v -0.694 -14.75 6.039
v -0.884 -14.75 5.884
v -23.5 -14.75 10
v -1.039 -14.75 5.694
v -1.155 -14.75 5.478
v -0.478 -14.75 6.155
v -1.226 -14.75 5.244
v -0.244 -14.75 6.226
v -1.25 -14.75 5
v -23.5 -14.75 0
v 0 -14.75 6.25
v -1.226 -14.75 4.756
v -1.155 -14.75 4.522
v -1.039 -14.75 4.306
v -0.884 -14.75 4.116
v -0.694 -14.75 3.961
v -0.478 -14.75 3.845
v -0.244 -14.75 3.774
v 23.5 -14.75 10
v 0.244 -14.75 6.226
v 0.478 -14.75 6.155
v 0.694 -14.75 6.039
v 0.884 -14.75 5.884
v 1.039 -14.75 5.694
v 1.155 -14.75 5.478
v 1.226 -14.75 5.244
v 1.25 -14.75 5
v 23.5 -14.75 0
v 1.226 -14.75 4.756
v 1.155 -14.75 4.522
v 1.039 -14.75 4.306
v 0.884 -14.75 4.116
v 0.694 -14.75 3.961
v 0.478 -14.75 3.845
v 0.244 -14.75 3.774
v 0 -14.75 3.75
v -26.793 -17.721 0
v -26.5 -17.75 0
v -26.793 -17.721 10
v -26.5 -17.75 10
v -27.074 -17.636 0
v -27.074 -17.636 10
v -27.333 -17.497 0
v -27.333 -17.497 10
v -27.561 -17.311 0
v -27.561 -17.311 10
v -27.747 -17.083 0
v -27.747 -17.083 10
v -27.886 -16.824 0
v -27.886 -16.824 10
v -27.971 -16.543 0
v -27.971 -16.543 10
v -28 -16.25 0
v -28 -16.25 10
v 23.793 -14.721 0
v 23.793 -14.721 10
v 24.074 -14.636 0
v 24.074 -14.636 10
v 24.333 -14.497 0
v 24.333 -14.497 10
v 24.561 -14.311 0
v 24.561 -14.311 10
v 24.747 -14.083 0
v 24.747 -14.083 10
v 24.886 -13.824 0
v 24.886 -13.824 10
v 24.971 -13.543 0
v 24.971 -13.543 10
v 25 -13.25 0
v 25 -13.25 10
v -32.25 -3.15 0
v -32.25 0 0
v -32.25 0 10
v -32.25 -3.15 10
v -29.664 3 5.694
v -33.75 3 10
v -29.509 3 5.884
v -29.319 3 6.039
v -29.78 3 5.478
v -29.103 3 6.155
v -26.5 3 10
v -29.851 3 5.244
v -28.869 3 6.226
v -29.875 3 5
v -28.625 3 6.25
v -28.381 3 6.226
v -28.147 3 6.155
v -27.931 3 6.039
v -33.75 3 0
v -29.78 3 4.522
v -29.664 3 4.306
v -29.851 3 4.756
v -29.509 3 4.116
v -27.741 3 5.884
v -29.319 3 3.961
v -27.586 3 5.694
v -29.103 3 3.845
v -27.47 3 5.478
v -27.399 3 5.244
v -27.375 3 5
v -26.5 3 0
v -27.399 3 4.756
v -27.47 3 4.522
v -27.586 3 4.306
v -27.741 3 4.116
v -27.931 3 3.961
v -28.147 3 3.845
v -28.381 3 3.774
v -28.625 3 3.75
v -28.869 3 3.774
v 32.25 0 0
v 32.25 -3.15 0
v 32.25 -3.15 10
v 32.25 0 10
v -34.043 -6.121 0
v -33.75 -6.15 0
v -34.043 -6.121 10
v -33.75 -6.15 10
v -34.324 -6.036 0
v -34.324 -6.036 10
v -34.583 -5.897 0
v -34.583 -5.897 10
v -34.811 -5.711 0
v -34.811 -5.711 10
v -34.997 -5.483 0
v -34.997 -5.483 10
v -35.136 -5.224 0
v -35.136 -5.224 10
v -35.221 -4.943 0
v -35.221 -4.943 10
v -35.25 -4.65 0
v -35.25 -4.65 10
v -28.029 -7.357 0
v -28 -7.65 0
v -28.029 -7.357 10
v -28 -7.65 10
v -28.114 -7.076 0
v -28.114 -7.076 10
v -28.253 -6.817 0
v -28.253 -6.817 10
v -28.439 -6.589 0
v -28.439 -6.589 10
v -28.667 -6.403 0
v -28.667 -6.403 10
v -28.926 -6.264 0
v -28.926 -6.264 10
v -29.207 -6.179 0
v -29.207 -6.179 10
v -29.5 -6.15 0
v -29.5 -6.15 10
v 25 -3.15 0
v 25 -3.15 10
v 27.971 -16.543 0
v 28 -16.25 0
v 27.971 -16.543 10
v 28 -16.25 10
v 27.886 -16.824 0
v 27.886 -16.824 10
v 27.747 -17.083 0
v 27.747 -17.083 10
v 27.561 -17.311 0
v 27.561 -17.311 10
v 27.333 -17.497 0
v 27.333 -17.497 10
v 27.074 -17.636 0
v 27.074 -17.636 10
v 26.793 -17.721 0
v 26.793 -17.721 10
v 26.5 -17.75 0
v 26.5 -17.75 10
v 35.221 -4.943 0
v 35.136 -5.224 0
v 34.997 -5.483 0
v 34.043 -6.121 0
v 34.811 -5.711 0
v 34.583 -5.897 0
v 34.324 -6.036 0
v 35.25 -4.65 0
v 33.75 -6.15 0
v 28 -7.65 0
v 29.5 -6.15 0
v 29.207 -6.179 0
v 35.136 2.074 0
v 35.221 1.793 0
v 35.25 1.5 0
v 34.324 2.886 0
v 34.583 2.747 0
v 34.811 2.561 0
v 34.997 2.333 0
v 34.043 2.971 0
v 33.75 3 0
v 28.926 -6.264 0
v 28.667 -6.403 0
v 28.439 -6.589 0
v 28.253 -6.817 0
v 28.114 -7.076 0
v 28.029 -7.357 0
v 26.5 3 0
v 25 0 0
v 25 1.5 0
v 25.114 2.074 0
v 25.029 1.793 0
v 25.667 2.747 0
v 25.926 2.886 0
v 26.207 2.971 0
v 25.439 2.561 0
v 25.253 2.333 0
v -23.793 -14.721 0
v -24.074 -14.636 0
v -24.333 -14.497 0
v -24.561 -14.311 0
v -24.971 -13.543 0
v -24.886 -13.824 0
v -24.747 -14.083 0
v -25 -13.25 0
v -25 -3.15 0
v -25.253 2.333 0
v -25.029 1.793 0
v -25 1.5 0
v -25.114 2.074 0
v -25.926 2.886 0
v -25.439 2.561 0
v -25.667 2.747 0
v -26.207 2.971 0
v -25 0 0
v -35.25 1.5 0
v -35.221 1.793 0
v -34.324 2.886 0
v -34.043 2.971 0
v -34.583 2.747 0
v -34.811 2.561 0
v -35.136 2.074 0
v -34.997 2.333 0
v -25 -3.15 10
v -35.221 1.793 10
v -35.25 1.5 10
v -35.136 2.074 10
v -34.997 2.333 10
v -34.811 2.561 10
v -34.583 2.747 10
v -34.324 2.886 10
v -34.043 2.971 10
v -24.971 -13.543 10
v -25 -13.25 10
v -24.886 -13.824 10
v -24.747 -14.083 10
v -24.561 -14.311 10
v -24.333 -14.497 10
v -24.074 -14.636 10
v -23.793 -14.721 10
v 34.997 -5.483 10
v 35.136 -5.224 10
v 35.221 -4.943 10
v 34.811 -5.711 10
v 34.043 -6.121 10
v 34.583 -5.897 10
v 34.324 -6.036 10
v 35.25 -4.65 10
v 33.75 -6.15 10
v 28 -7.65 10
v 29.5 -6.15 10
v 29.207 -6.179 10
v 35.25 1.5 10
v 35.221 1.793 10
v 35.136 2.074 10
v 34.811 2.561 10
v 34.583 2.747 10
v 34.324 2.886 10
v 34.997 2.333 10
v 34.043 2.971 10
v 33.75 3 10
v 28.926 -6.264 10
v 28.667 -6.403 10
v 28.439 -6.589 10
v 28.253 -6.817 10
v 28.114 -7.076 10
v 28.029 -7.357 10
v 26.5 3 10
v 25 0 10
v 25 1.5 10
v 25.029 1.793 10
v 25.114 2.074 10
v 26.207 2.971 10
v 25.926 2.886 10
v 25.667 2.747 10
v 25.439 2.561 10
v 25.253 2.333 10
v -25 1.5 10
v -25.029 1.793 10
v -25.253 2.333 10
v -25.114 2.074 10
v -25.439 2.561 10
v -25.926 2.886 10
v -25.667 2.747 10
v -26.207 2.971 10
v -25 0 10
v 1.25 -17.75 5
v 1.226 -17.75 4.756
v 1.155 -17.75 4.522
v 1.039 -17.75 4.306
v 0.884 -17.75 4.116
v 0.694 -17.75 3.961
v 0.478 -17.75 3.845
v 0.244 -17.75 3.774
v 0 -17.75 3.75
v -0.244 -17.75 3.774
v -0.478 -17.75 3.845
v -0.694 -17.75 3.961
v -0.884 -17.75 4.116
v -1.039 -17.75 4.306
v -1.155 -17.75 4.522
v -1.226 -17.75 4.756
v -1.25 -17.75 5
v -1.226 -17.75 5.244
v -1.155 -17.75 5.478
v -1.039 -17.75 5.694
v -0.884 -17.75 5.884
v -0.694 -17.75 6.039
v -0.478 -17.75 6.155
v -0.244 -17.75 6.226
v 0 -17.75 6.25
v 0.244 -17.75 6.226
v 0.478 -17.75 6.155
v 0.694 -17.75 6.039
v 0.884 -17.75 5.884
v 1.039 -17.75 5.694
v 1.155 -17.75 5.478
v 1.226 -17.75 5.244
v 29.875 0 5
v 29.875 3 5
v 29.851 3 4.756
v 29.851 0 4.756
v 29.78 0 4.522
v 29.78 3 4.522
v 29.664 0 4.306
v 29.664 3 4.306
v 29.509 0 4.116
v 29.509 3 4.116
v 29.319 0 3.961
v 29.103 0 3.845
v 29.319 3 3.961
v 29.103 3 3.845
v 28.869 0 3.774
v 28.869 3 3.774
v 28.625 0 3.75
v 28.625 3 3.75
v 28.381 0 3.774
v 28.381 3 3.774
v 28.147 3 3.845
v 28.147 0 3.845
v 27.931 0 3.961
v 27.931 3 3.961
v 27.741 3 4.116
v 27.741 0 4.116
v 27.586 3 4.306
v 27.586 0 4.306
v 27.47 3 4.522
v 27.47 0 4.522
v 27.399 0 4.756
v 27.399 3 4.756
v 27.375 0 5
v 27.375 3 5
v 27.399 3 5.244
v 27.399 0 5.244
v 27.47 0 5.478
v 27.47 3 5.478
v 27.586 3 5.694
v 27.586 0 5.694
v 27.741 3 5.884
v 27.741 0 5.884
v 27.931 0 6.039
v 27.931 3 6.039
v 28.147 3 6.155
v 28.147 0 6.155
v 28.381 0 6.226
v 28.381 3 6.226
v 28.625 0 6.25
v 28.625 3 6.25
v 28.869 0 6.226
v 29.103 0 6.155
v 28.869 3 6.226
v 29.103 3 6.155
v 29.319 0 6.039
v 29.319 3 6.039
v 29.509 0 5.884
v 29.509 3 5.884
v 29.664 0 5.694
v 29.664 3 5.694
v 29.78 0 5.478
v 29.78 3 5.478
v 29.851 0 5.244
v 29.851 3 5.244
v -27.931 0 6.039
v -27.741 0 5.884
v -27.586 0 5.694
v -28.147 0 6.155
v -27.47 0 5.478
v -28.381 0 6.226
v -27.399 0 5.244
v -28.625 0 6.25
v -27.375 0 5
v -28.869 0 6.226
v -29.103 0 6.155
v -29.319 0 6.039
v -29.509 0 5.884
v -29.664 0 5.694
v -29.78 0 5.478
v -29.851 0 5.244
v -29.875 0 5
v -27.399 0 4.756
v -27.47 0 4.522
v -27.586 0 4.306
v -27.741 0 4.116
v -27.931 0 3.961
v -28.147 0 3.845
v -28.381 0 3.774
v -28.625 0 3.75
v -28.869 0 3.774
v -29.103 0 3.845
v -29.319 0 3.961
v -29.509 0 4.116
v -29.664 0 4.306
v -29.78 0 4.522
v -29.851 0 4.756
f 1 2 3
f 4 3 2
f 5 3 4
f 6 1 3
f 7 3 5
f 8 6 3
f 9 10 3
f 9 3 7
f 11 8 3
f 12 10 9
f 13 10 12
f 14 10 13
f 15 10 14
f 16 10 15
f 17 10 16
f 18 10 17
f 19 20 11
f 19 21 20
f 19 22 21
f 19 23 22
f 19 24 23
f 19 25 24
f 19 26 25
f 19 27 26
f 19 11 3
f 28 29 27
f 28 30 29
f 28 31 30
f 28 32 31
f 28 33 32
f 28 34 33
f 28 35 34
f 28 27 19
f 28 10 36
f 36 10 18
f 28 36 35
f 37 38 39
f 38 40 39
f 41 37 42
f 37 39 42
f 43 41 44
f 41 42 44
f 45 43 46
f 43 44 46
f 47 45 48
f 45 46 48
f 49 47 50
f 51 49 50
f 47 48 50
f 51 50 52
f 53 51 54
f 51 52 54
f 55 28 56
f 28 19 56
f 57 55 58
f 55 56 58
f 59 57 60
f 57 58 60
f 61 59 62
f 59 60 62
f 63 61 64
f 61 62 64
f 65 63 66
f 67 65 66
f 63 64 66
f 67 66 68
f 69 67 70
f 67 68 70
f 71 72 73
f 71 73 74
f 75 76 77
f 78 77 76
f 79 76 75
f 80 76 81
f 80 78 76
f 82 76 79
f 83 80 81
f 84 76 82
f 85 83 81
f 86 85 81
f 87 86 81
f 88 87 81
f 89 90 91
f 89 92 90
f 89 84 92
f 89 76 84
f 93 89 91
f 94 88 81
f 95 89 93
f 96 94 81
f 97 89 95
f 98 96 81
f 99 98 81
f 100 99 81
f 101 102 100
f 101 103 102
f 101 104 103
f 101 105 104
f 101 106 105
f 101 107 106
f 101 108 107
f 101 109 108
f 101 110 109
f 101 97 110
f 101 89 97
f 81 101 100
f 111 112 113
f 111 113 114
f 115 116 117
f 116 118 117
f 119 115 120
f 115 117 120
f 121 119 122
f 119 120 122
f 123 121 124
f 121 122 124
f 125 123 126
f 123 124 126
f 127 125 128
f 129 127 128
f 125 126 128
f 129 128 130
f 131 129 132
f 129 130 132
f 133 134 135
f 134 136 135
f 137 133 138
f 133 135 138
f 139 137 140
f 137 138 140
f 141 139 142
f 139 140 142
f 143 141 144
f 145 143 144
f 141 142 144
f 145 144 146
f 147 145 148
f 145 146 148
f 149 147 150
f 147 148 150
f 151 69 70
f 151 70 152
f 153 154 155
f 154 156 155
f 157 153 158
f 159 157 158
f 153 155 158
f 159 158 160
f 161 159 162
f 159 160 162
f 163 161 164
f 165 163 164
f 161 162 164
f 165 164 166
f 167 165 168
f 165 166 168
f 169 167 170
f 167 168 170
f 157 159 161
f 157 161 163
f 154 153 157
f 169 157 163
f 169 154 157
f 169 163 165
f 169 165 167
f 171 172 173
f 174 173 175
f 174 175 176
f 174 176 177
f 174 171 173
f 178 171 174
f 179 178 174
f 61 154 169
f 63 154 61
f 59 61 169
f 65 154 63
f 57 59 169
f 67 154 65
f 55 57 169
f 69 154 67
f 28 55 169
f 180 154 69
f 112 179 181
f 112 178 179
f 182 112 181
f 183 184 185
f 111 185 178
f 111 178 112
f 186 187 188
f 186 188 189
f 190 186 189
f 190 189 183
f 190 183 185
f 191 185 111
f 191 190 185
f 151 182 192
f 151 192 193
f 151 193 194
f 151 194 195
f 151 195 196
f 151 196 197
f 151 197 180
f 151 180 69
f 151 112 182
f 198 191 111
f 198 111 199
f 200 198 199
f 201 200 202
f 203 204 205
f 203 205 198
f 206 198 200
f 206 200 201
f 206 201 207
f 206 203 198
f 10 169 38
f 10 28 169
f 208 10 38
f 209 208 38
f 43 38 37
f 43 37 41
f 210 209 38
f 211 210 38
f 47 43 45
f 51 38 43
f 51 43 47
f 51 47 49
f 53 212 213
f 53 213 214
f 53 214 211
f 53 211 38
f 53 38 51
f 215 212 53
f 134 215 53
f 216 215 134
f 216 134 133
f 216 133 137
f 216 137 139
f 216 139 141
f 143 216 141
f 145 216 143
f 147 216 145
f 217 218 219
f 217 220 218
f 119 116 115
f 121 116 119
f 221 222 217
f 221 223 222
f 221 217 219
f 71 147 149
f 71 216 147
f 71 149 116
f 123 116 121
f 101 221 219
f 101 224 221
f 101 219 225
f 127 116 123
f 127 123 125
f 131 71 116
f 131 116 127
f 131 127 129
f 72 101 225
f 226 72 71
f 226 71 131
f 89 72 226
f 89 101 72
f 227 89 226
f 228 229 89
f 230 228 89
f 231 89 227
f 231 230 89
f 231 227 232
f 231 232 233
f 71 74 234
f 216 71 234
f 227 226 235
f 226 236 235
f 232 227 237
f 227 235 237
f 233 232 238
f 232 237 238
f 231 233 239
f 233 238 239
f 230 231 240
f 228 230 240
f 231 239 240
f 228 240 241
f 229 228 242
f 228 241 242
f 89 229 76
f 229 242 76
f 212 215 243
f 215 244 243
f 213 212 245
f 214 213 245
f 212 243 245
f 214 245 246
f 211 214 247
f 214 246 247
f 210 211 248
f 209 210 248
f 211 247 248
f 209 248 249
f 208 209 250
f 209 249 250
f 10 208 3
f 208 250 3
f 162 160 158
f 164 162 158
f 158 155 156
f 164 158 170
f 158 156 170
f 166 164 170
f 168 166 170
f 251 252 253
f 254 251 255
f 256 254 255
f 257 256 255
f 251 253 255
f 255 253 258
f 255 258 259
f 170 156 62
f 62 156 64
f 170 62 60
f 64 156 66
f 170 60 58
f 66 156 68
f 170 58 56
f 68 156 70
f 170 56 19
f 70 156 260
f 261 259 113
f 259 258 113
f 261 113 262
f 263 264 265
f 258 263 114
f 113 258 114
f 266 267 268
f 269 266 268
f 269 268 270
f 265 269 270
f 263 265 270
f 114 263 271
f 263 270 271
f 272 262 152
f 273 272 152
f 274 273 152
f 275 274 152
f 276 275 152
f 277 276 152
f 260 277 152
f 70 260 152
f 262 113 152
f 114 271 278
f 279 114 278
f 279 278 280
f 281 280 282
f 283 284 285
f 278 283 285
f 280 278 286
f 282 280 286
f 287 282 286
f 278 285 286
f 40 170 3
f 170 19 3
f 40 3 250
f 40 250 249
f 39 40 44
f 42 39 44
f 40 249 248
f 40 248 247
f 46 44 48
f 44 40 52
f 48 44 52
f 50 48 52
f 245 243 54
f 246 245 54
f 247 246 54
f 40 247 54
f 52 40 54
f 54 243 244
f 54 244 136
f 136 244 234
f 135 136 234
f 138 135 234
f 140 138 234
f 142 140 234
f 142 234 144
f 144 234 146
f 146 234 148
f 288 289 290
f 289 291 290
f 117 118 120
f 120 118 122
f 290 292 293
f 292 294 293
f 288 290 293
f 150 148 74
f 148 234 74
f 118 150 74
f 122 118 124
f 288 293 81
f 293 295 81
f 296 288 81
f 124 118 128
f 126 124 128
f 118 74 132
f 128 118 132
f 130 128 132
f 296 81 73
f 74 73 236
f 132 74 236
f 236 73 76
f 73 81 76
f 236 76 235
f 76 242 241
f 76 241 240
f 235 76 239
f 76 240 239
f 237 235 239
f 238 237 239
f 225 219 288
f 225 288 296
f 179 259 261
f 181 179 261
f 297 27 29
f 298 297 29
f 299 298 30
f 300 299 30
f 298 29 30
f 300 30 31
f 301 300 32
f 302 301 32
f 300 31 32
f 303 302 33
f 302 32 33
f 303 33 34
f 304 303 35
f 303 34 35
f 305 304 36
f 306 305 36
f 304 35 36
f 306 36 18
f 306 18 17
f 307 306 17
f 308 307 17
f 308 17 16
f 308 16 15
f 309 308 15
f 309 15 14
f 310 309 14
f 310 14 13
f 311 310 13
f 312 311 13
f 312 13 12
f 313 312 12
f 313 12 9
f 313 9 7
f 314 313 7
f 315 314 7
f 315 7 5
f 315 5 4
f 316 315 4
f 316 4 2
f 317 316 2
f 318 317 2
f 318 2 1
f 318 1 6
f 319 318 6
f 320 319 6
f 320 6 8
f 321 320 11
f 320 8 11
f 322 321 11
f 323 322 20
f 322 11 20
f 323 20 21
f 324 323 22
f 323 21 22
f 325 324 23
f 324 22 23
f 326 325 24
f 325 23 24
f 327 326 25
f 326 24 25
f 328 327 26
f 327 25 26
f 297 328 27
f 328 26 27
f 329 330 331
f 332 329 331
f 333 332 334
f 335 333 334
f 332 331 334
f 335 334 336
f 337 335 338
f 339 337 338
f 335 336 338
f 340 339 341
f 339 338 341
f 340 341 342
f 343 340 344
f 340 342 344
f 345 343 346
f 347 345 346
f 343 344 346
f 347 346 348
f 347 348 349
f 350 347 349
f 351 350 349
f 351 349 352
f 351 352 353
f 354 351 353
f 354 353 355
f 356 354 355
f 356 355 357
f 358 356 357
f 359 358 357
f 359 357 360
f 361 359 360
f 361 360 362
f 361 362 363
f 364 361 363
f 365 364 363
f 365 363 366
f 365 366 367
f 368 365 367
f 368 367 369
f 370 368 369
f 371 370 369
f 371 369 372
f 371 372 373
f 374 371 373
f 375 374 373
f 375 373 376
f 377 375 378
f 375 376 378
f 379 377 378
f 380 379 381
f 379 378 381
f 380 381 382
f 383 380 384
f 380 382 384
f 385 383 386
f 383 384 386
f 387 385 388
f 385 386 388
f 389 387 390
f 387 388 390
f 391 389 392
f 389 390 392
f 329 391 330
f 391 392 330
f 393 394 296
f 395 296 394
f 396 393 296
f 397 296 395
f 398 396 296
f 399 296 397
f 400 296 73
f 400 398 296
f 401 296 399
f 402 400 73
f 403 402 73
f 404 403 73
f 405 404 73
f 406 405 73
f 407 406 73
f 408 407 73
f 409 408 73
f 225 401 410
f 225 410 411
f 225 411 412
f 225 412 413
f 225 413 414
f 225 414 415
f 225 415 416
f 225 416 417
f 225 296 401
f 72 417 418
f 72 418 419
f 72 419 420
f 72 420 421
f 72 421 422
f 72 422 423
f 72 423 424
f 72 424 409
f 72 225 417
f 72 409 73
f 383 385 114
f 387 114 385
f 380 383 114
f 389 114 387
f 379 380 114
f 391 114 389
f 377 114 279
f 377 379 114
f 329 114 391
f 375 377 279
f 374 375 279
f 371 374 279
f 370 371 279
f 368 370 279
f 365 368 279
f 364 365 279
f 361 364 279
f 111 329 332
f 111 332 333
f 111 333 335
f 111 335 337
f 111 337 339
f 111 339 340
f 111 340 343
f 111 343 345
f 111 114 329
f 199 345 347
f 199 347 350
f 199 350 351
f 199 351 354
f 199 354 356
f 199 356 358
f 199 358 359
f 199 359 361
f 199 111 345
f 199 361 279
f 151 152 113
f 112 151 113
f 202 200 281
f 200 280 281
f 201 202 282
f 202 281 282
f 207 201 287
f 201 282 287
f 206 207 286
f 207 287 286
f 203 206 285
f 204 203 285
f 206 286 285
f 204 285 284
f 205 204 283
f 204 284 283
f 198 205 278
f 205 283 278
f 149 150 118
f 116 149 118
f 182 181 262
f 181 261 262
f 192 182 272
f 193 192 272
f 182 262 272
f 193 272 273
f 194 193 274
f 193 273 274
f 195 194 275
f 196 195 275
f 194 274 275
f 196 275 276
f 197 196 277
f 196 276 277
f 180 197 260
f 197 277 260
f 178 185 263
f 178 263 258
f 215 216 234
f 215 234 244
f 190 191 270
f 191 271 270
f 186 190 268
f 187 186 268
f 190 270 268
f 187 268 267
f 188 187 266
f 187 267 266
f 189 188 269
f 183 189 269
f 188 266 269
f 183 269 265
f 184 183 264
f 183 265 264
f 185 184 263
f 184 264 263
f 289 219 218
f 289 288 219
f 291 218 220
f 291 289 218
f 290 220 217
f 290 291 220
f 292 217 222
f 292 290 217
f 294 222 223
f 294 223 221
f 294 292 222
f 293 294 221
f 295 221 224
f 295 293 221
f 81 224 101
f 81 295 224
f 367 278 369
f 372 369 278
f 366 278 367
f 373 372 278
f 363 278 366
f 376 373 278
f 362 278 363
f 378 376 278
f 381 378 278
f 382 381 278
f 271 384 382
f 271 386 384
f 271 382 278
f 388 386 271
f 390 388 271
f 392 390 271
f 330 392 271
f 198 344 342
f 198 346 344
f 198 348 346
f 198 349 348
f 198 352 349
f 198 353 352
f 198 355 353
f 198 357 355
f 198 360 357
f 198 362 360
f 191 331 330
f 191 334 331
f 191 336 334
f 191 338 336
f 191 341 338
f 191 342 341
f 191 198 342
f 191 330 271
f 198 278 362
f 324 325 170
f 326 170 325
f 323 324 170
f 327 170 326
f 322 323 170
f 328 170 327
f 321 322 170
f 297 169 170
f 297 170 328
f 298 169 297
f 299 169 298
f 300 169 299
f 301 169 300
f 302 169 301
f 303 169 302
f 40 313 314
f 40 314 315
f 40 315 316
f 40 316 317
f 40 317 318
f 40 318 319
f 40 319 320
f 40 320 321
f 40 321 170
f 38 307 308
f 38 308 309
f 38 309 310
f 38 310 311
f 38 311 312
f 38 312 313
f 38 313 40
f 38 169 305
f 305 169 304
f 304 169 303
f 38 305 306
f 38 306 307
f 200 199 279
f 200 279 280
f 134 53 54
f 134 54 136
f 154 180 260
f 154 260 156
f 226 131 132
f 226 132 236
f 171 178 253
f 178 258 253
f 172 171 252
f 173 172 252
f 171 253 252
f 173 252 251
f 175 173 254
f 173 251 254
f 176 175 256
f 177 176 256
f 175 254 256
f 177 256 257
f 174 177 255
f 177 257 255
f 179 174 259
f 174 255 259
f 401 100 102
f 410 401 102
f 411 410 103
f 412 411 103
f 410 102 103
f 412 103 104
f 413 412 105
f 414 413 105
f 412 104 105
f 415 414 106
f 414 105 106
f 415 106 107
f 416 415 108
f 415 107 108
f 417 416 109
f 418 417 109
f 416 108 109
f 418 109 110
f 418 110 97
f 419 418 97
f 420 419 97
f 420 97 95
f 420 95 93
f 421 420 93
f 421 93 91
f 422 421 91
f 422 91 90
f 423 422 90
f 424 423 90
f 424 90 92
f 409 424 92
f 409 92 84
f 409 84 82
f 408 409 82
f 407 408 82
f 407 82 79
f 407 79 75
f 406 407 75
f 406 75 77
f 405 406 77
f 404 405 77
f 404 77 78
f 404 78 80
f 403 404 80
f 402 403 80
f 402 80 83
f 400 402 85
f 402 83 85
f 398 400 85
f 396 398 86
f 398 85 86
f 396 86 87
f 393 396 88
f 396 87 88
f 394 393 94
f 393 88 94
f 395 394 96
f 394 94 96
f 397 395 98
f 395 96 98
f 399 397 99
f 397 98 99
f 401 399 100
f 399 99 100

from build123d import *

# Parameters (mm, degrees)
BOSS_EXTRUDE1_DEPTH = 10
CUT_EXTRUDE2_REACH  = 22.75
SKETCH4_R           = 1.25
SKETCH5_R           = 1.25
CUT_EXTRUDE3_DEPTH  = 4
FILLET1_R           = 1.5


with BuildPart() as part:
    # Sketch1 → Boss-Extrude1 (new body)
    with BuildSketch(Plane.XY):
        Polygon((-32.25, 0), (-32.25, -3.15), (-25, -3.15), (-25, -14.75), (25, -14.75), (25, -3.15), (32.25, -3.15), (32.25, 0), (25, 0), (25, 3), (35.25, 3), (35.25, -6.15), (28, -6.15), (28, -17.75), (-28, -17.75), (-28, -6.15), (-35.25, -6.15), (-35.25, 3), (-25, 3), (-25, 0), align=None)
    extrude(amount=BOSS_EXTRUDE1_DEPTH)

    # Sketch4 → Cut-Extrude2 (cut, up to next)
    with BuildSketch(Plane(origin=(0, 3, 0), x_dir=(1, 0, 0), z_dir=(0, 1, 0)), mode=Mode.PRIVATE) as cut_extrude2_sk1:
        with Locations((-28.625, -5)):
            Circle(SKETCH4_R)
    cut_extrude2_tool1 = extrude(cut_extrude2_sk1.sketch, amount=-CUT_EXTRUDE2_REACH, mode=Mode.PRIVATE) & part.part
    add(cut_extrude2_tool1.solids().sort_by_distance((-28.625, 3, 5))[0], mode=Mode.SUBTRACT)
    # Sketch4 → Cut-Extrude2 (cut, up to next)
    with BuildSketch(Plane(origin=(0, 3, 0), x_dir=(1, 0, 0), z_dir=(0, 1, 0)), mode=Mode.PRIVATE) as cut_extrude2_sk2:
        with Locations((28.625, -5)):
            Circle(SKETCH4_R)
    cut_extrude2_tool2 = extrude(cut_extrude2_sk2.sketch, amount=-CUT_EXTRUDE2_REACH, mode=Mode.PRIVATE) & part.part
    add(cut_extrude2_tool2.solids().sort_by_distance((28.625, 3, 5))[0], mode=Mode.SUBTRACT)

    # Sketch5 → Cut-Extrude3 (cut, through all)
    with BuildSketch(Plane(origin=(0, -14.75, 0), x_dir=(1, 0, 0), z_dir=(0, 1, 0))):
        with Locations((0, -5)):
            Circle(SKETCH5_R)
    extrude(amount=-CUT_EXTRUDE3_DEPTH, mode=Mode.SUBTRACT)

    # Fillet1
    fillet1_edges = [part.edges().sort_by_distance(p)[0] for p in [
        (-25, -14.75, 5),
        (25, -14.75, 5),
        (25, 3, 5),
        (35.25, 3, 5),
        (35.25, -6.15, 5),
        (28, -6.15, 5),
        (28, -17.75, 5),
        (-28, -17.75, 5),
        (-28, -6.15, 5),
        (-35.25, -6.15, 5),
        (-35.25, 3, 5),
        (-25, 3, 5),
    ]]
    fillet(fillet1_edges, radius=FILLET1_R)


solid = part.part
